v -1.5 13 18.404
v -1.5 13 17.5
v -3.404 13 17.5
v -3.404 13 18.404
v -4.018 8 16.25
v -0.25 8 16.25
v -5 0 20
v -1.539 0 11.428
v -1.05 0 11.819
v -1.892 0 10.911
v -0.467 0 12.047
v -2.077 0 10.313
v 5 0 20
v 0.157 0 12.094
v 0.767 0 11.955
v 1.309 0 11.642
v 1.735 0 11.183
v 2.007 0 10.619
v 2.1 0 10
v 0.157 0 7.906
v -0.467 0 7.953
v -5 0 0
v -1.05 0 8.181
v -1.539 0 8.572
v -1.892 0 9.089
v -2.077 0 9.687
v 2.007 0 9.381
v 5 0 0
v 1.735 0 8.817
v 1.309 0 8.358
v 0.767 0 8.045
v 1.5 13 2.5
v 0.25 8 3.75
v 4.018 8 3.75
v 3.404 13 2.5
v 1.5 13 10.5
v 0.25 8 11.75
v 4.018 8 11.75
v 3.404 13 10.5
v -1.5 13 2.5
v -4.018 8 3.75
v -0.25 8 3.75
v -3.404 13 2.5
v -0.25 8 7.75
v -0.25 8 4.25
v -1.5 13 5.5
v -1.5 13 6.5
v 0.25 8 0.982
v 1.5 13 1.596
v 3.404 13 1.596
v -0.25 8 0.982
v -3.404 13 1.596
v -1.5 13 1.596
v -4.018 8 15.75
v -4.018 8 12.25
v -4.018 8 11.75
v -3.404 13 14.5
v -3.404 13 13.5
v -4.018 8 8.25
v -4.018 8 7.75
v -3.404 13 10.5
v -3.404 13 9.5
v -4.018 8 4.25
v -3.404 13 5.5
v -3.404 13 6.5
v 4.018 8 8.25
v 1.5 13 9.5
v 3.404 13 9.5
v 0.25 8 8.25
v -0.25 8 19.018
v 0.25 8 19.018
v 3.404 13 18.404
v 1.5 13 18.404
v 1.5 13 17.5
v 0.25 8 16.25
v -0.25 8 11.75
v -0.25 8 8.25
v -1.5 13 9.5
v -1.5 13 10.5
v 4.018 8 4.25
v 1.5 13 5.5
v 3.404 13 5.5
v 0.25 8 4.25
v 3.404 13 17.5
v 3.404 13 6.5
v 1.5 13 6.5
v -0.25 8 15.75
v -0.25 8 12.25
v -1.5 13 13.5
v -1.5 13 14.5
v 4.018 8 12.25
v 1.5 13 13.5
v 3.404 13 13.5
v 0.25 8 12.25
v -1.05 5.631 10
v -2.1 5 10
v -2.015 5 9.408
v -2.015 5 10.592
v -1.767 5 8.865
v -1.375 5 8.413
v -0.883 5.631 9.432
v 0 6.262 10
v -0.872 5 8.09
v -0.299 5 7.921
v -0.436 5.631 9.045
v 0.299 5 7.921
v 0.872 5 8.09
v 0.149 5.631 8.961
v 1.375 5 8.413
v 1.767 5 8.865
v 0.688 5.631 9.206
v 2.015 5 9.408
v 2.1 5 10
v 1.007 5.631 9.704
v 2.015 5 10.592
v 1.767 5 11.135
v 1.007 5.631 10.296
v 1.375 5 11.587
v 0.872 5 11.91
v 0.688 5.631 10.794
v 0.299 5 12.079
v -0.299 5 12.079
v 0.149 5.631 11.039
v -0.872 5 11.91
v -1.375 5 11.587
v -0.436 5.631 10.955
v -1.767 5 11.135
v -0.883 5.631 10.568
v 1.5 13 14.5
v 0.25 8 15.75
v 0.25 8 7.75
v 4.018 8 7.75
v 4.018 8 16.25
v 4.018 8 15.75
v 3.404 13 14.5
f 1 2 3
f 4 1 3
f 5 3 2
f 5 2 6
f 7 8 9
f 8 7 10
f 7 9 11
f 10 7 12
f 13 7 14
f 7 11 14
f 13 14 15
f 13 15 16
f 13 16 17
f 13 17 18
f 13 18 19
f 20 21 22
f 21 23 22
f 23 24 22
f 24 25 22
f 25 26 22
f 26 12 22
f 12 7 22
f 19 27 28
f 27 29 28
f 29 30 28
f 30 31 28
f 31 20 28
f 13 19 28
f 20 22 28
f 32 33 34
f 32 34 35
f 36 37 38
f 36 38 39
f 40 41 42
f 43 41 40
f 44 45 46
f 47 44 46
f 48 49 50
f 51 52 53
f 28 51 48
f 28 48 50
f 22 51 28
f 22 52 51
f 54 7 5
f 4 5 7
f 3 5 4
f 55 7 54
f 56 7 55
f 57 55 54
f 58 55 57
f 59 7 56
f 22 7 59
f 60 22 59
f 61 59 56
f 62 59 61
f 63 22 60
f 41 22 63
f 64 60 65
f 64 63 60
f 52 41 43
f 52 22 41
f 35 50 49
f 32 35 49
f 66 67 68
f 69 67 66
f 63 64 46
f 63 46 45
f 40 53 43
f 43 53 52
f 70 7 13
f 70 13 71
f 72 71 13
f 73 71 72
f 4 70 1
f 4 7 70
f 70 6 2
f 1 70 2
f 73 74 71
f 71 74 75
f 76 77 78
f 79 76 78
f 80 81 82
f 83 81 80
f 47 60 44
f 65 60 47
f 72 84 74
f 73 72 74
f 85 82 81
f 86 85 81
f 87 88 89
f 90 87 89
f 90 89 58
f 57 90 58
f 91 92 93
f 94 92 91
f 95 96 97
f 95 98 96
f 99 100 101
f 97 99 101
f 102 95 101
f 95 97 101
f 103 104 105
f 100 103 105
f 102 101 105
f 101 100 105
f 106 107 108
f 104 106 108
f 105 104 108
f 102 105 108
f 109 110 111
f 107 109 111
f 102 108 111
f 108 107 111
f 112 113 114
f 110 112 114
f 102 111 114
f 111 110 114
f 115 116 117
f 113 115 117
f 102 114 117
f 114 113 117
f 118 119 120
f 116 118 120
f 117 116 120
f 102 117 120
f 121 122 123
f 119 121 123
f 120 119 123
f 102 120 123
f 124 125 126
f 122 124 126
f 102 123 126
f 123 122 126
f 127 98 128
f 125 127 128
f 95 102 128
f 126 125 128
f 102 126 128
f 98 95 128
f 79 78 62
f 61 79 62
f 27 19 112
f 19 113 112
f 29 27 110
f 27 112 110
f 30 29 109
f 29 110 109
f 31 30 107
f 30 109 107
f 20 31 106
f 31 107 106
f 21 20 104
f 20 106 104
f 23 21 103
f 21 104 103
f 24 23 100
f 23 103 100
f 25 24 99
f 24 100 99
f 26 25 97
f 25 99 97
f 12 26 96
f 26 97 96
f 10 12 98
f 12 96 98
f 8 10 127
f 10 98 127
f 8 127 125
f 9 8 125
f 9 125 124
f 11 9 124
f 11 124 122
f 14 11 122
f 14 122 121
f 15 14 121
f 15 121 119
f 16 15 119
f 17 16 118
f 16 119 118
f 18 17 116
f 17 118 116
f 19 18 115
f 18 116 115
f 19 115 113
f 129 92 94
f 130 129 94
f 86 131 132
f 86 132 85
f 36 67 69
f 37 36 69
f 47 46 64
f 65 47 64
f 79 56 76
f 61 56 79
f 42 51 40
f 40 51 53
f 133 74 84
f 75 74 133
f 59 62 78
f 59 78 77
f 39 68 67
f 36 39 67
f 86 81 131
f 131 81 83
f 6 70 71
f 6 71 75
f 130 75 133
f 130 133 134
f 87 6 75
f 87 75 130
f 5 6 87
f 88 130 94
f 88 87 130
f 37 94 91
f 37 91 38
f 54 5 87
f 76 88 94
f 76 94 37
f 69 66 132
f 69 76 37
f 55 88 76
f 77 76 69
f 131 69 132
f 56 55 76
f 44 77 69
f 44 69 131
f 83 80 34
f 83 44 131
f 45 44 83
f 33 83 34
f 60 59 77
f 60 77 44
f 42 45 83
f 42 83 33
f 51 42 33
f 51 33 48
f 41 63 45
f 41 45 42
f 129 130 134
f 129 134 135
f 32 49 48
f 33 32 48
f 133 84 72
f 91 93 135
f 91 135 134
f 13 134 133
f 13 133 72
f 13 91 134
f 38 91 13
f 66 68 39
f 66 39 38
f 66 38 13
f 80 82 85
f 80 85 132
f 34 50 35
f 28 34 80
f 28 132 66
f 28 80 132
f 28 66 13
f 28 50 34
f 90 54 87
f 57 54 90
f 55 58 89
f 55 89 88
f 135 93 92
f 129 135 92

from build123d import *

# Parameters (mm, degrees)
RESSALTO_EXTRUS_O1_DEPTH   = 20
INCLINA_O1_DEPTH           = 20
INCLINA_O1_START           = -6
INCLINA_O1_2_DEPTH         = 12
CORTE_EXTRUS_O1_DEPTH      = 25.372115214
CORTE_EXTRUS_O1_DEPTH_BACK = 25.372115214
M5_GEWINDEBOHRUNG1_D       = 4.2
M5_GEWINDEBOHRUNG1_DEPTH   = 5
M5_GEWINDEBOHRUNG1_TIP     = 1.2618073


with BuildPart() as part:
    # Esboço1 → Ressalto-extrusão1 (new body)
    with BuildSketch(Plane.XY):
        Polygon((-5, 0), (5, 0), (3.5, 13), (1.5, 13), (0.25, 8), (-0.25, 8), (-1.5, 13), (-3.5, 13), align=None)
    extrude(amount=RESSALTO_EXTRUS_O1_DEPTH)

    # Inclinação1: read off the stored shape, not the designer's step
    # Inclinação1 outline → Inclinação1 (cut)
    with BuildSketch(Plane.XY):
        Polygon((3.5, 13), (3.403800708, 13), (5, 0), align=None)
        Polygon((-5, 0), (-3.403800708, 13), (-3.5, 13), align=None)
    extrude(amount=INCLINA_O1_DEPTH, mode=Mode.SUBTRACT)

    # Inclina_o1 2 outline → Inclina_o1 2 (cut)
    with BuildSketch(Plane.YZ.offset(INCLINA_O1_START)):
        Polygon((13, 18.403800708), (13, 20), (0, 20), align=None)
        Polygon((13, 0), (13, 1.596199292), (0, 0), align=None)
    extrude(amount=INCLINA_O1_2_DEPTH, mode=Mode.SUBTRACT)

    # Esboço3 → Corte-extrusão1 (cut, two sides: drawn at the far end of the back side and taken through both)
    with BuildSketch(Plane(origin=(0, 0, 0), x_dir=(0, 0, -1), z_dir=(1, 0, 0)).offset(-CORTE_EXTRUS_O1_DEPTH_BACK)):
        Polygon((-17.5, 13), (-16.25, 8), (-15.75, 8), (-14.5, 13), align=None)
        Polygon((-13.5, 13), (-12.25, 8), (-11.75, 8), (-10.5, 13), align=None)
        Polygon((-9.5, 13), (-8.25, 8), (-7.75, 8), (-6.5, 13), align=None)
        Polygon((-5.5, 13), (-4.25, 8), (-3.75, 8), (-2.5, 13), align=None)
    extrude(amount=CORTE_EXTRUS_O1_DEPTH + CORTE_EXTRUS_O1_DEPTH_BACK, mode=Mode.SUBTRACT)

    # M5 Gewindebohrung1
    with Locations(Plane(origin=(0, 0, 10), x_dir=(-1, 0, 0), z_dir=(0, -1, 0))):
        with Locations((0, 0)):
            Hole(M5_GEWINDEBOHRUNG1_D / 2, depth=M5_GEWINDEBOHRUNG1_DEPTH)
            with Locations((0, 0, -(M5_GEWINDEBOHRUNG1_DEPTH + M5_GEWINDEBOHRUNG1_TIP / 2))):  # 118° drill point
                Cone(0, M5_GEWINDEBOHRUNG1_D / 2, M5_GEWINDEBOHRUNG1_TIP, mode=Mode.SUBTRACT)


solid = part.part
